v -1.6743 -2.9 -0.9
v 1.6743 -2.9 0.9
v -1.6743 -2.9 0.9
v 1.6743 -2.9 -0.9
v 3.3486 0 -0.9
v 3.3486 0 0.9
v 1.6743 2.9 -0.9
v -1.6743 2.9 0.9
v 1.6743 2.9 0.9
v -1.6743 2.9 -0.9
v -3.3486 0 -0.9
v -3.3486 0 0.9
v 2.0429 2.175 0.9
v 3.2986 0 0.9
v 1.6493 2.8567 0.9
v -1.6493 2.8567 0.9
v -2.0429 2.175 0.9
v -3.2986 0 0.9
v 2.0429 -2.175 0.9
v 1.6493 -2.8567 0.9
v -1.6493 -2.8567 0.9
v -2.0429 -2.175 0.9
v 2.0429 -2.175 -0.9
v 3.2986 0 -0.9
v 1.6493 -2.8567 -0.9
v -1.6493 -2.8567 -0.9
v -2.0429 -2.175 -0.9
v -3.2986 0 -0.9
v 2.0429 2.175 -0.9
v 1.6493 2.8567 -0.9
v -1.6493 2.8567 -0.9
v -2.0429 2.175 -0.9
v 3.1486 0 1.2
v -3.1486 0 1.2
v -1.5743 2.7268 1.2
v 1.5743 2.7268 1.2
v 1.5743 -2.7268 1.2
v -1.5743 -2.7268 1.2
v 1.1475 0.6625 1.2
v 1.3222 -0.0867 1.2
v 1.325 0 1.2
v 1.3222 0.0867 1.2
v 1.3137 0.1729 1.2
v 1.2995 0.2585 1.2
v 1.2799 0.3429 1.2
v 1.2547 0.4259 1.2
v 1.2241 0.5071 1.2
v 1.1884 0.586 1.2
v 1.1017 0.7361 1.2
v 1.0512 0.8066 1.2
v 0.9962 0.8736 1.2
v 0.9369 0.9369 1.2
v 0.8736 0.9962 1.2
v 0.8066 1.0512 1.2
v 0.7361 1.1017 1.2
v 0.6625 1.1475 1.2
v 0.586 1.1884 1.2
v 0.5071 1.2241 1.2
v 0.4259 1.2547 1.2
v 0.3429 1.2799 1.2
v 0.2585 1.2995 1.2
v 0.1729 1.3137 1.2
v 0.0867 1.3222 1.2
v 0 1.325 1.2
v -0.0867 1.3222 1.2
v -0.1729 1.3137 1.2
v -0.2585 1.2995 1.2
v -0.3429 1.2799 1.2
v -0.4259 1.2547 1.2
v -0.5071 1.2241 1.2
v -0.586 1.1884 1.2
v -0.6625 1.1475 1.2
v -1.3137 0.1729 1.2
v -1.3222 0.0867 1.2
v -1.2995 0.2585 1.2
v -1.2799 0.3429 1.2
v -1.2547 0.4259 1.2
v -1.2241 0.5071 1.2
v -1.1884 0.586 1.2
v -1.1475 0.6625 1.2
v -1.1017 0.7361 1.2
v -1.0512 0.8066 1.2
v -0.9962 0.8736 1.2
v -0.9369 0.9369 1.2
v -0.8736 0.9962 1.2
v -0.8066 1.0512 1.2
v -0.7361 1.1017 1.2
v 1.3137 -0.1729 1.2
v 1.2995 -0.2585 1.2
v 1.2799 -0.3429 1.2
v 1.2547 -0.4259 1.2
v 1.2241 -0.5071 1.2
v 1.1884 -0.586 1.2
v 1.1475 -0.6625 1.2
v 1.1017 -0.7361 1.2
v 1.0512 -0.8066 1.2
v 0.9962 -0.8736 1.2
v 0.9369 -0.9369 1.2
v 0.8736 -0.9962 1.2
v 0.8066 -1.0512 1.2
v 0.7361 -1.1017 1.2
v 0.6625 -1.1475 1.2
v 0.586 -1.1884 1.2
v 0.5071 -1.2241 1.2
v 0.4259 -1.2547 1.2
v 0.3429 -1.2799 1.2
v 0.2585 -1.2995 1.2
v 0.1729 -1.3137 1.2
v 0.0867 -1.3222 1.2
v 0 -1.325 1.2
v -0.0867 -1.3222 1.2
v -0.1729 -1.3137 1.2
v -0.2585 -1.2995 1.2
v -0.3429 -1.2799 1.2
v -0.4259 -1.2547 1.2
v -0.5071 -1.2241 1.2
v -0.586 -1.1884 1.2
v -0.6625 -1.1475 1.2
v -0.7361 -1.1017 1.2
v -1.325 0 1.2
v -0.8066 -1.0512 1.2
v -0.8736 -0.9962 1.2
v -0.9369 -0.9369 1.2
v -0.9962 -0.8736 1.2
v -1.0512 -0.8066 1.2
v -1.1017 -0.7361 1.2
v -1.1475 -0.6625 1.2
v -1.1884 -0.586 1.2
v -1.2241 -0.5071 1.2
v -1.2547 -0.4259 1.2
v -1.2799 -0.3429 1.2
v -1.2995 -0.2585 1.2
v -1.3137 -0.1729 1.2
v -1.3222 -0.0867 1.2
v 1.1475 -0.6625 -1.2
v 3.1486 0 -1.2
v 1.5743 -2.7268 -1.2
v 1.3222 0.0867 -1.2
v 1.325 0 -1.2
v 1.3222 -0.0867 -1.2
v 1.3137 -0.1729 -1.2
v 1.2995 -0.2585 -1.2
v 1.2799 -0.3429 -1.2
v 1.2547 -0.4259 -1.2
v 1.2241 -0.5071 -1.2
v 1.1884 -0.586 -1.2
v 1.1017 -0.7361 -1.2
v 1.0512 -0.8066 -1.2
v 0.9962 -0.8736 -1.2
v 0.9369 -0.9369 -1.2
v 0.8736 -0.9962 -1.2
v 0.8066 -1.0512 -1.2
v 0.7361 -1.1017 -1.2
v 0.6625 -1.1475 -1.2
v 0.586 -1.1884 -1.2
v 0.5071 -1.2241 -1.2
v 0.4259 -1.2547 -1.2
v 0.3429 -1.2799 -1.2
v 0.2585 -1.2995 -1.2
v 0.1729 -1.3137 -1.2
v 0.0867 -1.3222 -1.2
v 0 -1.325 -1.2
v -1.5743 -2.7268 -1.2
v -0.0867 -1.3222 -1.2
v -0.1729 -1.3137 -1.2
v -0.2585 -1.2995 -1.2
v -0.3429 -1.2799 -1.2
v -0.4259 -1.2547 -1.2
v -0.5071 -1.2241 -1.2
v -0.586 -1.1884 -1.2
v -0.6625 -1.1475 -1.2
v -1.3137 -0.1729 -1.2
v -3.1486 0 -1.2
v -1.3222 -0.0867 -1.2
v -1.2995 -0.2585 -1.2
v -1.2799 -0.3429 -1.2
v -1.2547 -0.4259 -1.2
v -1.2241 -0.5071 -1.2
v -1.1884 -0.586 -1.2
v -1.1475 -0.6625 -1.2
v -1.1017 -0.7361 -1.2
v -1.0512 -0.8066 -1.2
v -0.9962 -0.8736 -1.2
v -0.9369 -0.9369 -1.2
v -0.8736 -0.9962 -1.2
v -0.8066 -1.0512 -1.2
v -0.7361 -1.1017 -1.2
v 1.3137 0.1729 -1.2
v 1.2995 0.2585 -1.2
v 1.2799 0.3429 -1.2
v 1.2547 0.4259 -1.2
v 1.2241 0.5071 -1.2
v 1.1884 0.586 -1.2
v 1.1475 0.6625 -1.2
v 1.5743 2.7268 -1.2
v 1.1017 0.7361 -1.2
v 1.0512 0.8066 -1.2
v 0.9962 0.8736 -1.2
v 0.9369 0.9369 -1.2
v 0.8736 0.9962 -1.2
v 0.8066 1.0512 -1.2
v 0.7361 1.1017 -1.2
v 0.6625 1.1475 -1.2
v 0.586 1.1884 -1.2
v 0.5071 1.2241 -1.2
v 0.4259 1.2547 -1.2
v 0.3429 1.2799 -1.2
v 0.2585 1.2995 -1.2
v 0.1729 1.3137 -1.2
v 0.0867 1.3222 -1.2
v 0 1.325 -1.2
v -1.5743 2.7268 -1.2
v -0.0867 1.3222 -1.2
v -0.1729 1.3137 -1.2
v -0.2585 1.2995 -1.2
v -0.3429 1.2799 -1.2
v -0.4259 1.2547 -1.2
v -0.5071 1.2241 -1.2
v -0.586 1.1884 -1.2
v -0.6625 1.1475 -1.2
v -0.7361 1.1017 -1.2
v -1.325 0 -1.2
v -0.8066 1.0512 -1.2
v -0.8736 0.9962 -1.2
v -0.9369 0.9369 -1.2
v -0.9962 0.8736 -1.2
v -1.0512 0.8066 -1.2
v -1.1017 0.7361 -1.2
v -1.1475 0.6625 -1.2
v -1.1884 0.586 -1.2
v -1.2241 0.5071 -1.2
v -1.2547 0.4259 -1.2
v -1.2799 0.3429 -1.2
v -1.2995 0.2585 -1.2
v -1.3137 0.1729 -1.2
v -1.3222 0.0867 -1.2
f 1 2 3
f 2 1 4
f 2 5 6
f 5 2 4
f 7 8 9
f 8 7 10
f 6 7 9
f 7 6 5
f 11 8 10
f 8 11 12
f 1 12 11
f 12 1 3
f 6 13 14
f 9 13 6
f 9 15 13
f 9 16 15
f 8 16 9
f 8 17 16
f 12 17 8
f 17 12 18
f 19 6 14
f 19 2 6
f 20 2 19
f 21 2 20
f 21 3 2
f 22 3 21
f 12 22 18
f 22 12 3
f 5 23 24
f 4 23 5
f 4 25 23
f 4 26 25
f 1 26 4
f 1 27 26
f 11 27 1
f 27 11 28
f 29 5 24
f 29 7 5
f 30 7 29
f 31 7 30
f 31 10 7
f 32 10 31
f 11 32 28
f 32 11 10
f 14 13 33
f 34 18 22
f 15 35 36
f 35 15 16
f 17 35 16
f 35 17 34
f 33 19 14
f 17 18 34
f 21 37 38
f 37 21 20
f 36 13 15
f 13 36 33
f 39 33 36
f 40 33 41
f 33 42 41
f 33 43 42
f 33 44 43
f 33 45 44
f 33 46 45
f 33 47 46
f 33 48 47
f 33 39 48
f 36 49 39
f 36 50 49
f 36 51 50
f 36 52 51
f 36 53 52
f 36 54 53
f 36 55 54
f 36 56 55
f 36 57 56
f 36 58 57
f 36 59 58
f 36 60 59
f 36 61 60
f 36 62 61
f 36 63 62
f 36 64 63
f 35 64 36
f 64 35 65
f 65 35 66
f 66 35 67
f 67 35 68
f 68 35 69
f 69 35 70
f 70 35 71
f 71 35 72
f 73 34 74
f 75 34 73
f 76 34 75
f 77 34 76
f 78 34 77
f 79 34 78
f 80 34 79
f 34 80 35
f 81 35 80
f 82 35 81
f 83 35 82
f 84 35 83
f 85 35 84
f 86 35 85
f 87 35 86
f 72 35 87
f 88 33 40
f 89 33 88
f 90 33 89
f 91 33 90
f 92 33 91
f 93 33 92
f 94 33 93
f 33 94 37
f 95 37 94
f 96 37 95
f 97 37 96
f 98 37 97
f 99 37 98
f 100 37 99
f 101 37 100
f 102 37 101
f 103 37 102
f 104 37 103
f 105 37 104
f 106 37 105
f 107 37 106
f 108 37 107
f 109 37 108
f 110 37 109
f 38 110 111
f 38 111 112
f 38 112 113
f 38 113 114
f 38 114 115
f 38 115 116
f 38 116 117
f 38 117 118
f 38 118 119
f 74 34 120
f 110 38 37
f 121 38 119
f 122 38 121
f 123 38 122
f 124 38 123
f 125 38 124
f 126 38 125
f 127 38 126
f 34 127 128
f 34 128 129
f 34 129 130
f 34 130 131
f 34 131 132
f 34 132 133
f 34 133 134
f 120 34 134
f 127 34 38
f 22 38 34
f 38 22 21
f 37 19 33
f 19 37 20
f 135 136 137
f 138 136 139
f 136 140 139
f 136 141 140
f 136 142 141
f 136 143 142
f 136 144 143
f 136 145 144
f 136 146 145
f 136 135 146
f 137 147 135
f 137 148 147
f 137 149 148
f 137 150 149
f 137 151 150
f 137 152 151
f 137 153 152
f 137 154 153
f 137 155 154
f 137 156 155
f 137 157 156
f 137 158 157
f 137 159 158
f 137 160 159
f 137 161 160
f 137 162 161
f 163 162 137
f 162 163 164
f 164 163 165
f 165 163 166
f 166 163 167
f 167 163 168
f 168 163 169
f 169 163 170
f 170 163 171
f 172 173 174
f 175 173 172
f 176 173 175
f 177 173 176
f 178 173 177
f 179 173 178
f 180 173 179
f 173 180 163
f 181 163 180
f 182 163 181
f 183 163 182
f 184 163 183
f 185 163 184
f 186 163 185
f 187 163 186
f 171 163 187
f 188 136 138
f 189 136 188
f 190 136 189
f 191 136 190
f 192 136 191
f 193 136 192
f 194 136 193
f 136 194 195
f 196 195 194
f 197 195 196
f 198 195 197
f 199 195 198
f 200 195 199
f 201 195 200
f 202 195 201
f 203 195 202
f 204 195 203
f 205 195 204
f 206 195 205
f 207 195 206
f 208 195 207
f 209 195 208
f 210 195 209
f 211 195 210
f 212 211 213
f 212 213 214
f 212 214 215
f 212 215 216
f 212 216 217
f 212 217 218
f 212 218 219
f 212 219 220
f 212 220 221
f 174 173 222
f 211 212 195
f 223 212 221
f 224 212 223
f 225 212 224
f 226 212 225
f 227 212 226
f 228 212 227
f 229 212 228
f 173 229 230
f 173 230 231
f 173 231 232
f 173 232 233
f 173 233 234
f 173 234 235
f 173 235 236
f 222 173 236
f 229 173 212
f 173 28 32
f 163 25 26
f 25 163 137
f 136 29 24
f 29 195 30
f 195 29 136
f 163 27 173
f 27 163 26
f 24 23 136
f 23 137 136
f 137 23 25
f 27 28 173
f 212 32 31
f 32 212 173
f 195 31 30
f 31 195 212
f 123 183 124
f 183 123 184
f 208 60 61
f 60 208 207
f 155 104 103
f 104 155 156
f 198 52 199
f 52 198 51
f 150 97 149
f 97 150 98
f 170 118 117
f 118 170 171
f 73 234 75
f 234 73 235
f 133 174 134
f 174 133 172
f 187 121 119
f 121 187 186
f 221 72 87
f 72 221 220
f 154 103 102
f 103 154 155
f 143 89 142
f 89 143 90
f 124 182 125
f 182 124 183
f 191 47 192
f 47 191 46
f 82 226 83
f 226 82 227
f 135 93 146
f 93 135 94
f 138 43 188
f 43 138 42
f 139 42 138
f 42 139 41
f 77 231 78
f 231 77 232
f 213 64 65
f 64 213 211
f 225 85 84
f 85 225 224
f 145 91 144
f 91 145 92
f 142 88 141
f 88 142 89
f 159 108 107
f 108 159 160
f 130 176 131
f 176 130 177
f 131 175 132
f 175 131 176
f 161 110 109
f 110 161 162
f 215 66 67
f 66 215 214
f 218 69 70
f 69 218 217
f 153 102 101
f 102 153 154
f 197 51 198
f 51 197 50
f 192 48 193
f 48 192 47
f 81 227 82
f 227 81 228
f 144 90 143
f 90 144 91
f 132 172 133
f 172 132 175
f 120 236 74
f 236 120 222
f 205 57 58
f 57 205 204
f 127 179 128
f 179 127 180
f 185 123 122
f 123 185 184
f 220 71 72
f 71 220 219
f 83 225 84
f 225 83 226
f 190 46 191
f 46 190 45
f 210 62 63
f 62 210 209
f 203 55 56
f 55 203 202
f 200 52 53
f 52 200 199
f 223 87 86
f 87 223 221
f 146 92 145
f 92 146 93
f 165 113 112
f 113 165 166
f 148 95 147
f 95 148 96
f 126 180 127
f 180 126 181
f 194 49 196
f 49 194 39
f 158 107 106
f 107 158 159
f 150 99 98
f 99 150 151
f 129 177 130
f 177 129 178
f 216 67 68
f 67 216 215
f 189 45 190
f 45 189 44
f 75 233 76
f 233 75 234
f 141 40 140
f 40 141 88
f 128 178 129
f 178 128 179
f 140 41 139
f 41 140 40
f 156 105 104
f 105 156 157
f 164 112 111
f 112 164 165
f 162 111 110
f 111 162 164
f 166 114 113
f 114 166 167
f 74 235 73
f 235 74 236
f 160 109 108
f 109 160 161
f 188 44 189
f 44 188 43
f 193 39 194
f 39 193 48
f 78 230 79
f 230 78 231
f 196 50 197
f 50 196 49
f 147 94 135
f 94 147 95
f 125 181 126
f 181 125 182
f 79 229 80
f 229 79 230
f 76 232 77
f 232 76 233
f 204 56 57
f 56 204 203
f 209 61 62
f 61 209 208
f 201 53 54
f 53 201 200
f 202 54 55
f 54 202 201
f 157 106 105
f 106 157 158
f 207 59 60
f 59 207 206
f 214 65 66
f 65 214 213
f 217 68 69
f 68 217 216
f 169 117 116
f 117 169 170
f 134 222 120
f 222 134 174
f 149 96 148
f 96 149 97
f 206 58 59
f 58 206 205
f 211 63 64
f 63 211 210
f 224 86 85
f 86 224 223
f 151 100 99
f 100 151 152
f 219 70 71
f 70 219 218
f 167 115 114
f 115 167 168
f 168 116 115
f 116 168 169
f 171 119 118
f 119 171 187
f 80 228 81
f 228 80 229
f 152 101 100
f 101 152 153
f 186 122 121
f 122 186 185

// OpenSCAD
// Plain hex nut for M2.5
// Target: 5.8mm across flats, 2.2mm thick, circular bore (no flange/washer)

// Parameters
thread_diameter_mm = 2.5;          // nominal screw diameter
across_flats_mm    = 5.8;          // hex across flats
thickness_mm       = 2.2;          // nut thickness
tolerance_mm       = 0.15;         // clearance for printed hole
edge_chamfer_mm    = 0.2;          // small outer edge chamfer
overlap_mm         = 0.2;          // boolean overlap

$fn = 96;

// Helpers
function hex_circumradius_from_flats(af) = af / sqrt(3); // R such that across flats = sqrt(3)*R

module hex_nut_plain(af, h, hole_d, chamfer) {
    R = hex_circumradius_from_flats(af);

    difference() {
        // Outer hex with slight chamfer on both faces (still 6 flats)
        union() {
            // Middle straight section
            cylinder(r=R, h=max(h - 2*chamfer, 0.01), center=true, $fn=6);

            // Top chamfer
            translate([0, 0, (h/2) - (chamfer/2)])
                cylinder(r1=R, r2=max(R - chamfer, 0.01), h=chamfer + overlap_mm, center=true, $fn=6);

            // Bottom chamfer
            translate([0, 0, -(h/2) + (chamfer/2)])
                cylinder(r1=max(R - chamfer, 0.01), r2=R, h=chamfer + overlap_mm, center=true, $fn=6);
        }

        // Circular through-hole (clearance)
        cylinder(d=hole_d, h=h + 2*overlap_mm, center=true, $fn=96);
    }
}

module assembly() {
    // Plain nut only (no washer/flange/step)
    hex_nut_plain(
        af=across_flats_mm,
        h=thickness_mm,
        hole_d=thread_diameter_mm + tolerance_mm,
        chamfer=edge_chamfer_mm
    );
}

assembly();
